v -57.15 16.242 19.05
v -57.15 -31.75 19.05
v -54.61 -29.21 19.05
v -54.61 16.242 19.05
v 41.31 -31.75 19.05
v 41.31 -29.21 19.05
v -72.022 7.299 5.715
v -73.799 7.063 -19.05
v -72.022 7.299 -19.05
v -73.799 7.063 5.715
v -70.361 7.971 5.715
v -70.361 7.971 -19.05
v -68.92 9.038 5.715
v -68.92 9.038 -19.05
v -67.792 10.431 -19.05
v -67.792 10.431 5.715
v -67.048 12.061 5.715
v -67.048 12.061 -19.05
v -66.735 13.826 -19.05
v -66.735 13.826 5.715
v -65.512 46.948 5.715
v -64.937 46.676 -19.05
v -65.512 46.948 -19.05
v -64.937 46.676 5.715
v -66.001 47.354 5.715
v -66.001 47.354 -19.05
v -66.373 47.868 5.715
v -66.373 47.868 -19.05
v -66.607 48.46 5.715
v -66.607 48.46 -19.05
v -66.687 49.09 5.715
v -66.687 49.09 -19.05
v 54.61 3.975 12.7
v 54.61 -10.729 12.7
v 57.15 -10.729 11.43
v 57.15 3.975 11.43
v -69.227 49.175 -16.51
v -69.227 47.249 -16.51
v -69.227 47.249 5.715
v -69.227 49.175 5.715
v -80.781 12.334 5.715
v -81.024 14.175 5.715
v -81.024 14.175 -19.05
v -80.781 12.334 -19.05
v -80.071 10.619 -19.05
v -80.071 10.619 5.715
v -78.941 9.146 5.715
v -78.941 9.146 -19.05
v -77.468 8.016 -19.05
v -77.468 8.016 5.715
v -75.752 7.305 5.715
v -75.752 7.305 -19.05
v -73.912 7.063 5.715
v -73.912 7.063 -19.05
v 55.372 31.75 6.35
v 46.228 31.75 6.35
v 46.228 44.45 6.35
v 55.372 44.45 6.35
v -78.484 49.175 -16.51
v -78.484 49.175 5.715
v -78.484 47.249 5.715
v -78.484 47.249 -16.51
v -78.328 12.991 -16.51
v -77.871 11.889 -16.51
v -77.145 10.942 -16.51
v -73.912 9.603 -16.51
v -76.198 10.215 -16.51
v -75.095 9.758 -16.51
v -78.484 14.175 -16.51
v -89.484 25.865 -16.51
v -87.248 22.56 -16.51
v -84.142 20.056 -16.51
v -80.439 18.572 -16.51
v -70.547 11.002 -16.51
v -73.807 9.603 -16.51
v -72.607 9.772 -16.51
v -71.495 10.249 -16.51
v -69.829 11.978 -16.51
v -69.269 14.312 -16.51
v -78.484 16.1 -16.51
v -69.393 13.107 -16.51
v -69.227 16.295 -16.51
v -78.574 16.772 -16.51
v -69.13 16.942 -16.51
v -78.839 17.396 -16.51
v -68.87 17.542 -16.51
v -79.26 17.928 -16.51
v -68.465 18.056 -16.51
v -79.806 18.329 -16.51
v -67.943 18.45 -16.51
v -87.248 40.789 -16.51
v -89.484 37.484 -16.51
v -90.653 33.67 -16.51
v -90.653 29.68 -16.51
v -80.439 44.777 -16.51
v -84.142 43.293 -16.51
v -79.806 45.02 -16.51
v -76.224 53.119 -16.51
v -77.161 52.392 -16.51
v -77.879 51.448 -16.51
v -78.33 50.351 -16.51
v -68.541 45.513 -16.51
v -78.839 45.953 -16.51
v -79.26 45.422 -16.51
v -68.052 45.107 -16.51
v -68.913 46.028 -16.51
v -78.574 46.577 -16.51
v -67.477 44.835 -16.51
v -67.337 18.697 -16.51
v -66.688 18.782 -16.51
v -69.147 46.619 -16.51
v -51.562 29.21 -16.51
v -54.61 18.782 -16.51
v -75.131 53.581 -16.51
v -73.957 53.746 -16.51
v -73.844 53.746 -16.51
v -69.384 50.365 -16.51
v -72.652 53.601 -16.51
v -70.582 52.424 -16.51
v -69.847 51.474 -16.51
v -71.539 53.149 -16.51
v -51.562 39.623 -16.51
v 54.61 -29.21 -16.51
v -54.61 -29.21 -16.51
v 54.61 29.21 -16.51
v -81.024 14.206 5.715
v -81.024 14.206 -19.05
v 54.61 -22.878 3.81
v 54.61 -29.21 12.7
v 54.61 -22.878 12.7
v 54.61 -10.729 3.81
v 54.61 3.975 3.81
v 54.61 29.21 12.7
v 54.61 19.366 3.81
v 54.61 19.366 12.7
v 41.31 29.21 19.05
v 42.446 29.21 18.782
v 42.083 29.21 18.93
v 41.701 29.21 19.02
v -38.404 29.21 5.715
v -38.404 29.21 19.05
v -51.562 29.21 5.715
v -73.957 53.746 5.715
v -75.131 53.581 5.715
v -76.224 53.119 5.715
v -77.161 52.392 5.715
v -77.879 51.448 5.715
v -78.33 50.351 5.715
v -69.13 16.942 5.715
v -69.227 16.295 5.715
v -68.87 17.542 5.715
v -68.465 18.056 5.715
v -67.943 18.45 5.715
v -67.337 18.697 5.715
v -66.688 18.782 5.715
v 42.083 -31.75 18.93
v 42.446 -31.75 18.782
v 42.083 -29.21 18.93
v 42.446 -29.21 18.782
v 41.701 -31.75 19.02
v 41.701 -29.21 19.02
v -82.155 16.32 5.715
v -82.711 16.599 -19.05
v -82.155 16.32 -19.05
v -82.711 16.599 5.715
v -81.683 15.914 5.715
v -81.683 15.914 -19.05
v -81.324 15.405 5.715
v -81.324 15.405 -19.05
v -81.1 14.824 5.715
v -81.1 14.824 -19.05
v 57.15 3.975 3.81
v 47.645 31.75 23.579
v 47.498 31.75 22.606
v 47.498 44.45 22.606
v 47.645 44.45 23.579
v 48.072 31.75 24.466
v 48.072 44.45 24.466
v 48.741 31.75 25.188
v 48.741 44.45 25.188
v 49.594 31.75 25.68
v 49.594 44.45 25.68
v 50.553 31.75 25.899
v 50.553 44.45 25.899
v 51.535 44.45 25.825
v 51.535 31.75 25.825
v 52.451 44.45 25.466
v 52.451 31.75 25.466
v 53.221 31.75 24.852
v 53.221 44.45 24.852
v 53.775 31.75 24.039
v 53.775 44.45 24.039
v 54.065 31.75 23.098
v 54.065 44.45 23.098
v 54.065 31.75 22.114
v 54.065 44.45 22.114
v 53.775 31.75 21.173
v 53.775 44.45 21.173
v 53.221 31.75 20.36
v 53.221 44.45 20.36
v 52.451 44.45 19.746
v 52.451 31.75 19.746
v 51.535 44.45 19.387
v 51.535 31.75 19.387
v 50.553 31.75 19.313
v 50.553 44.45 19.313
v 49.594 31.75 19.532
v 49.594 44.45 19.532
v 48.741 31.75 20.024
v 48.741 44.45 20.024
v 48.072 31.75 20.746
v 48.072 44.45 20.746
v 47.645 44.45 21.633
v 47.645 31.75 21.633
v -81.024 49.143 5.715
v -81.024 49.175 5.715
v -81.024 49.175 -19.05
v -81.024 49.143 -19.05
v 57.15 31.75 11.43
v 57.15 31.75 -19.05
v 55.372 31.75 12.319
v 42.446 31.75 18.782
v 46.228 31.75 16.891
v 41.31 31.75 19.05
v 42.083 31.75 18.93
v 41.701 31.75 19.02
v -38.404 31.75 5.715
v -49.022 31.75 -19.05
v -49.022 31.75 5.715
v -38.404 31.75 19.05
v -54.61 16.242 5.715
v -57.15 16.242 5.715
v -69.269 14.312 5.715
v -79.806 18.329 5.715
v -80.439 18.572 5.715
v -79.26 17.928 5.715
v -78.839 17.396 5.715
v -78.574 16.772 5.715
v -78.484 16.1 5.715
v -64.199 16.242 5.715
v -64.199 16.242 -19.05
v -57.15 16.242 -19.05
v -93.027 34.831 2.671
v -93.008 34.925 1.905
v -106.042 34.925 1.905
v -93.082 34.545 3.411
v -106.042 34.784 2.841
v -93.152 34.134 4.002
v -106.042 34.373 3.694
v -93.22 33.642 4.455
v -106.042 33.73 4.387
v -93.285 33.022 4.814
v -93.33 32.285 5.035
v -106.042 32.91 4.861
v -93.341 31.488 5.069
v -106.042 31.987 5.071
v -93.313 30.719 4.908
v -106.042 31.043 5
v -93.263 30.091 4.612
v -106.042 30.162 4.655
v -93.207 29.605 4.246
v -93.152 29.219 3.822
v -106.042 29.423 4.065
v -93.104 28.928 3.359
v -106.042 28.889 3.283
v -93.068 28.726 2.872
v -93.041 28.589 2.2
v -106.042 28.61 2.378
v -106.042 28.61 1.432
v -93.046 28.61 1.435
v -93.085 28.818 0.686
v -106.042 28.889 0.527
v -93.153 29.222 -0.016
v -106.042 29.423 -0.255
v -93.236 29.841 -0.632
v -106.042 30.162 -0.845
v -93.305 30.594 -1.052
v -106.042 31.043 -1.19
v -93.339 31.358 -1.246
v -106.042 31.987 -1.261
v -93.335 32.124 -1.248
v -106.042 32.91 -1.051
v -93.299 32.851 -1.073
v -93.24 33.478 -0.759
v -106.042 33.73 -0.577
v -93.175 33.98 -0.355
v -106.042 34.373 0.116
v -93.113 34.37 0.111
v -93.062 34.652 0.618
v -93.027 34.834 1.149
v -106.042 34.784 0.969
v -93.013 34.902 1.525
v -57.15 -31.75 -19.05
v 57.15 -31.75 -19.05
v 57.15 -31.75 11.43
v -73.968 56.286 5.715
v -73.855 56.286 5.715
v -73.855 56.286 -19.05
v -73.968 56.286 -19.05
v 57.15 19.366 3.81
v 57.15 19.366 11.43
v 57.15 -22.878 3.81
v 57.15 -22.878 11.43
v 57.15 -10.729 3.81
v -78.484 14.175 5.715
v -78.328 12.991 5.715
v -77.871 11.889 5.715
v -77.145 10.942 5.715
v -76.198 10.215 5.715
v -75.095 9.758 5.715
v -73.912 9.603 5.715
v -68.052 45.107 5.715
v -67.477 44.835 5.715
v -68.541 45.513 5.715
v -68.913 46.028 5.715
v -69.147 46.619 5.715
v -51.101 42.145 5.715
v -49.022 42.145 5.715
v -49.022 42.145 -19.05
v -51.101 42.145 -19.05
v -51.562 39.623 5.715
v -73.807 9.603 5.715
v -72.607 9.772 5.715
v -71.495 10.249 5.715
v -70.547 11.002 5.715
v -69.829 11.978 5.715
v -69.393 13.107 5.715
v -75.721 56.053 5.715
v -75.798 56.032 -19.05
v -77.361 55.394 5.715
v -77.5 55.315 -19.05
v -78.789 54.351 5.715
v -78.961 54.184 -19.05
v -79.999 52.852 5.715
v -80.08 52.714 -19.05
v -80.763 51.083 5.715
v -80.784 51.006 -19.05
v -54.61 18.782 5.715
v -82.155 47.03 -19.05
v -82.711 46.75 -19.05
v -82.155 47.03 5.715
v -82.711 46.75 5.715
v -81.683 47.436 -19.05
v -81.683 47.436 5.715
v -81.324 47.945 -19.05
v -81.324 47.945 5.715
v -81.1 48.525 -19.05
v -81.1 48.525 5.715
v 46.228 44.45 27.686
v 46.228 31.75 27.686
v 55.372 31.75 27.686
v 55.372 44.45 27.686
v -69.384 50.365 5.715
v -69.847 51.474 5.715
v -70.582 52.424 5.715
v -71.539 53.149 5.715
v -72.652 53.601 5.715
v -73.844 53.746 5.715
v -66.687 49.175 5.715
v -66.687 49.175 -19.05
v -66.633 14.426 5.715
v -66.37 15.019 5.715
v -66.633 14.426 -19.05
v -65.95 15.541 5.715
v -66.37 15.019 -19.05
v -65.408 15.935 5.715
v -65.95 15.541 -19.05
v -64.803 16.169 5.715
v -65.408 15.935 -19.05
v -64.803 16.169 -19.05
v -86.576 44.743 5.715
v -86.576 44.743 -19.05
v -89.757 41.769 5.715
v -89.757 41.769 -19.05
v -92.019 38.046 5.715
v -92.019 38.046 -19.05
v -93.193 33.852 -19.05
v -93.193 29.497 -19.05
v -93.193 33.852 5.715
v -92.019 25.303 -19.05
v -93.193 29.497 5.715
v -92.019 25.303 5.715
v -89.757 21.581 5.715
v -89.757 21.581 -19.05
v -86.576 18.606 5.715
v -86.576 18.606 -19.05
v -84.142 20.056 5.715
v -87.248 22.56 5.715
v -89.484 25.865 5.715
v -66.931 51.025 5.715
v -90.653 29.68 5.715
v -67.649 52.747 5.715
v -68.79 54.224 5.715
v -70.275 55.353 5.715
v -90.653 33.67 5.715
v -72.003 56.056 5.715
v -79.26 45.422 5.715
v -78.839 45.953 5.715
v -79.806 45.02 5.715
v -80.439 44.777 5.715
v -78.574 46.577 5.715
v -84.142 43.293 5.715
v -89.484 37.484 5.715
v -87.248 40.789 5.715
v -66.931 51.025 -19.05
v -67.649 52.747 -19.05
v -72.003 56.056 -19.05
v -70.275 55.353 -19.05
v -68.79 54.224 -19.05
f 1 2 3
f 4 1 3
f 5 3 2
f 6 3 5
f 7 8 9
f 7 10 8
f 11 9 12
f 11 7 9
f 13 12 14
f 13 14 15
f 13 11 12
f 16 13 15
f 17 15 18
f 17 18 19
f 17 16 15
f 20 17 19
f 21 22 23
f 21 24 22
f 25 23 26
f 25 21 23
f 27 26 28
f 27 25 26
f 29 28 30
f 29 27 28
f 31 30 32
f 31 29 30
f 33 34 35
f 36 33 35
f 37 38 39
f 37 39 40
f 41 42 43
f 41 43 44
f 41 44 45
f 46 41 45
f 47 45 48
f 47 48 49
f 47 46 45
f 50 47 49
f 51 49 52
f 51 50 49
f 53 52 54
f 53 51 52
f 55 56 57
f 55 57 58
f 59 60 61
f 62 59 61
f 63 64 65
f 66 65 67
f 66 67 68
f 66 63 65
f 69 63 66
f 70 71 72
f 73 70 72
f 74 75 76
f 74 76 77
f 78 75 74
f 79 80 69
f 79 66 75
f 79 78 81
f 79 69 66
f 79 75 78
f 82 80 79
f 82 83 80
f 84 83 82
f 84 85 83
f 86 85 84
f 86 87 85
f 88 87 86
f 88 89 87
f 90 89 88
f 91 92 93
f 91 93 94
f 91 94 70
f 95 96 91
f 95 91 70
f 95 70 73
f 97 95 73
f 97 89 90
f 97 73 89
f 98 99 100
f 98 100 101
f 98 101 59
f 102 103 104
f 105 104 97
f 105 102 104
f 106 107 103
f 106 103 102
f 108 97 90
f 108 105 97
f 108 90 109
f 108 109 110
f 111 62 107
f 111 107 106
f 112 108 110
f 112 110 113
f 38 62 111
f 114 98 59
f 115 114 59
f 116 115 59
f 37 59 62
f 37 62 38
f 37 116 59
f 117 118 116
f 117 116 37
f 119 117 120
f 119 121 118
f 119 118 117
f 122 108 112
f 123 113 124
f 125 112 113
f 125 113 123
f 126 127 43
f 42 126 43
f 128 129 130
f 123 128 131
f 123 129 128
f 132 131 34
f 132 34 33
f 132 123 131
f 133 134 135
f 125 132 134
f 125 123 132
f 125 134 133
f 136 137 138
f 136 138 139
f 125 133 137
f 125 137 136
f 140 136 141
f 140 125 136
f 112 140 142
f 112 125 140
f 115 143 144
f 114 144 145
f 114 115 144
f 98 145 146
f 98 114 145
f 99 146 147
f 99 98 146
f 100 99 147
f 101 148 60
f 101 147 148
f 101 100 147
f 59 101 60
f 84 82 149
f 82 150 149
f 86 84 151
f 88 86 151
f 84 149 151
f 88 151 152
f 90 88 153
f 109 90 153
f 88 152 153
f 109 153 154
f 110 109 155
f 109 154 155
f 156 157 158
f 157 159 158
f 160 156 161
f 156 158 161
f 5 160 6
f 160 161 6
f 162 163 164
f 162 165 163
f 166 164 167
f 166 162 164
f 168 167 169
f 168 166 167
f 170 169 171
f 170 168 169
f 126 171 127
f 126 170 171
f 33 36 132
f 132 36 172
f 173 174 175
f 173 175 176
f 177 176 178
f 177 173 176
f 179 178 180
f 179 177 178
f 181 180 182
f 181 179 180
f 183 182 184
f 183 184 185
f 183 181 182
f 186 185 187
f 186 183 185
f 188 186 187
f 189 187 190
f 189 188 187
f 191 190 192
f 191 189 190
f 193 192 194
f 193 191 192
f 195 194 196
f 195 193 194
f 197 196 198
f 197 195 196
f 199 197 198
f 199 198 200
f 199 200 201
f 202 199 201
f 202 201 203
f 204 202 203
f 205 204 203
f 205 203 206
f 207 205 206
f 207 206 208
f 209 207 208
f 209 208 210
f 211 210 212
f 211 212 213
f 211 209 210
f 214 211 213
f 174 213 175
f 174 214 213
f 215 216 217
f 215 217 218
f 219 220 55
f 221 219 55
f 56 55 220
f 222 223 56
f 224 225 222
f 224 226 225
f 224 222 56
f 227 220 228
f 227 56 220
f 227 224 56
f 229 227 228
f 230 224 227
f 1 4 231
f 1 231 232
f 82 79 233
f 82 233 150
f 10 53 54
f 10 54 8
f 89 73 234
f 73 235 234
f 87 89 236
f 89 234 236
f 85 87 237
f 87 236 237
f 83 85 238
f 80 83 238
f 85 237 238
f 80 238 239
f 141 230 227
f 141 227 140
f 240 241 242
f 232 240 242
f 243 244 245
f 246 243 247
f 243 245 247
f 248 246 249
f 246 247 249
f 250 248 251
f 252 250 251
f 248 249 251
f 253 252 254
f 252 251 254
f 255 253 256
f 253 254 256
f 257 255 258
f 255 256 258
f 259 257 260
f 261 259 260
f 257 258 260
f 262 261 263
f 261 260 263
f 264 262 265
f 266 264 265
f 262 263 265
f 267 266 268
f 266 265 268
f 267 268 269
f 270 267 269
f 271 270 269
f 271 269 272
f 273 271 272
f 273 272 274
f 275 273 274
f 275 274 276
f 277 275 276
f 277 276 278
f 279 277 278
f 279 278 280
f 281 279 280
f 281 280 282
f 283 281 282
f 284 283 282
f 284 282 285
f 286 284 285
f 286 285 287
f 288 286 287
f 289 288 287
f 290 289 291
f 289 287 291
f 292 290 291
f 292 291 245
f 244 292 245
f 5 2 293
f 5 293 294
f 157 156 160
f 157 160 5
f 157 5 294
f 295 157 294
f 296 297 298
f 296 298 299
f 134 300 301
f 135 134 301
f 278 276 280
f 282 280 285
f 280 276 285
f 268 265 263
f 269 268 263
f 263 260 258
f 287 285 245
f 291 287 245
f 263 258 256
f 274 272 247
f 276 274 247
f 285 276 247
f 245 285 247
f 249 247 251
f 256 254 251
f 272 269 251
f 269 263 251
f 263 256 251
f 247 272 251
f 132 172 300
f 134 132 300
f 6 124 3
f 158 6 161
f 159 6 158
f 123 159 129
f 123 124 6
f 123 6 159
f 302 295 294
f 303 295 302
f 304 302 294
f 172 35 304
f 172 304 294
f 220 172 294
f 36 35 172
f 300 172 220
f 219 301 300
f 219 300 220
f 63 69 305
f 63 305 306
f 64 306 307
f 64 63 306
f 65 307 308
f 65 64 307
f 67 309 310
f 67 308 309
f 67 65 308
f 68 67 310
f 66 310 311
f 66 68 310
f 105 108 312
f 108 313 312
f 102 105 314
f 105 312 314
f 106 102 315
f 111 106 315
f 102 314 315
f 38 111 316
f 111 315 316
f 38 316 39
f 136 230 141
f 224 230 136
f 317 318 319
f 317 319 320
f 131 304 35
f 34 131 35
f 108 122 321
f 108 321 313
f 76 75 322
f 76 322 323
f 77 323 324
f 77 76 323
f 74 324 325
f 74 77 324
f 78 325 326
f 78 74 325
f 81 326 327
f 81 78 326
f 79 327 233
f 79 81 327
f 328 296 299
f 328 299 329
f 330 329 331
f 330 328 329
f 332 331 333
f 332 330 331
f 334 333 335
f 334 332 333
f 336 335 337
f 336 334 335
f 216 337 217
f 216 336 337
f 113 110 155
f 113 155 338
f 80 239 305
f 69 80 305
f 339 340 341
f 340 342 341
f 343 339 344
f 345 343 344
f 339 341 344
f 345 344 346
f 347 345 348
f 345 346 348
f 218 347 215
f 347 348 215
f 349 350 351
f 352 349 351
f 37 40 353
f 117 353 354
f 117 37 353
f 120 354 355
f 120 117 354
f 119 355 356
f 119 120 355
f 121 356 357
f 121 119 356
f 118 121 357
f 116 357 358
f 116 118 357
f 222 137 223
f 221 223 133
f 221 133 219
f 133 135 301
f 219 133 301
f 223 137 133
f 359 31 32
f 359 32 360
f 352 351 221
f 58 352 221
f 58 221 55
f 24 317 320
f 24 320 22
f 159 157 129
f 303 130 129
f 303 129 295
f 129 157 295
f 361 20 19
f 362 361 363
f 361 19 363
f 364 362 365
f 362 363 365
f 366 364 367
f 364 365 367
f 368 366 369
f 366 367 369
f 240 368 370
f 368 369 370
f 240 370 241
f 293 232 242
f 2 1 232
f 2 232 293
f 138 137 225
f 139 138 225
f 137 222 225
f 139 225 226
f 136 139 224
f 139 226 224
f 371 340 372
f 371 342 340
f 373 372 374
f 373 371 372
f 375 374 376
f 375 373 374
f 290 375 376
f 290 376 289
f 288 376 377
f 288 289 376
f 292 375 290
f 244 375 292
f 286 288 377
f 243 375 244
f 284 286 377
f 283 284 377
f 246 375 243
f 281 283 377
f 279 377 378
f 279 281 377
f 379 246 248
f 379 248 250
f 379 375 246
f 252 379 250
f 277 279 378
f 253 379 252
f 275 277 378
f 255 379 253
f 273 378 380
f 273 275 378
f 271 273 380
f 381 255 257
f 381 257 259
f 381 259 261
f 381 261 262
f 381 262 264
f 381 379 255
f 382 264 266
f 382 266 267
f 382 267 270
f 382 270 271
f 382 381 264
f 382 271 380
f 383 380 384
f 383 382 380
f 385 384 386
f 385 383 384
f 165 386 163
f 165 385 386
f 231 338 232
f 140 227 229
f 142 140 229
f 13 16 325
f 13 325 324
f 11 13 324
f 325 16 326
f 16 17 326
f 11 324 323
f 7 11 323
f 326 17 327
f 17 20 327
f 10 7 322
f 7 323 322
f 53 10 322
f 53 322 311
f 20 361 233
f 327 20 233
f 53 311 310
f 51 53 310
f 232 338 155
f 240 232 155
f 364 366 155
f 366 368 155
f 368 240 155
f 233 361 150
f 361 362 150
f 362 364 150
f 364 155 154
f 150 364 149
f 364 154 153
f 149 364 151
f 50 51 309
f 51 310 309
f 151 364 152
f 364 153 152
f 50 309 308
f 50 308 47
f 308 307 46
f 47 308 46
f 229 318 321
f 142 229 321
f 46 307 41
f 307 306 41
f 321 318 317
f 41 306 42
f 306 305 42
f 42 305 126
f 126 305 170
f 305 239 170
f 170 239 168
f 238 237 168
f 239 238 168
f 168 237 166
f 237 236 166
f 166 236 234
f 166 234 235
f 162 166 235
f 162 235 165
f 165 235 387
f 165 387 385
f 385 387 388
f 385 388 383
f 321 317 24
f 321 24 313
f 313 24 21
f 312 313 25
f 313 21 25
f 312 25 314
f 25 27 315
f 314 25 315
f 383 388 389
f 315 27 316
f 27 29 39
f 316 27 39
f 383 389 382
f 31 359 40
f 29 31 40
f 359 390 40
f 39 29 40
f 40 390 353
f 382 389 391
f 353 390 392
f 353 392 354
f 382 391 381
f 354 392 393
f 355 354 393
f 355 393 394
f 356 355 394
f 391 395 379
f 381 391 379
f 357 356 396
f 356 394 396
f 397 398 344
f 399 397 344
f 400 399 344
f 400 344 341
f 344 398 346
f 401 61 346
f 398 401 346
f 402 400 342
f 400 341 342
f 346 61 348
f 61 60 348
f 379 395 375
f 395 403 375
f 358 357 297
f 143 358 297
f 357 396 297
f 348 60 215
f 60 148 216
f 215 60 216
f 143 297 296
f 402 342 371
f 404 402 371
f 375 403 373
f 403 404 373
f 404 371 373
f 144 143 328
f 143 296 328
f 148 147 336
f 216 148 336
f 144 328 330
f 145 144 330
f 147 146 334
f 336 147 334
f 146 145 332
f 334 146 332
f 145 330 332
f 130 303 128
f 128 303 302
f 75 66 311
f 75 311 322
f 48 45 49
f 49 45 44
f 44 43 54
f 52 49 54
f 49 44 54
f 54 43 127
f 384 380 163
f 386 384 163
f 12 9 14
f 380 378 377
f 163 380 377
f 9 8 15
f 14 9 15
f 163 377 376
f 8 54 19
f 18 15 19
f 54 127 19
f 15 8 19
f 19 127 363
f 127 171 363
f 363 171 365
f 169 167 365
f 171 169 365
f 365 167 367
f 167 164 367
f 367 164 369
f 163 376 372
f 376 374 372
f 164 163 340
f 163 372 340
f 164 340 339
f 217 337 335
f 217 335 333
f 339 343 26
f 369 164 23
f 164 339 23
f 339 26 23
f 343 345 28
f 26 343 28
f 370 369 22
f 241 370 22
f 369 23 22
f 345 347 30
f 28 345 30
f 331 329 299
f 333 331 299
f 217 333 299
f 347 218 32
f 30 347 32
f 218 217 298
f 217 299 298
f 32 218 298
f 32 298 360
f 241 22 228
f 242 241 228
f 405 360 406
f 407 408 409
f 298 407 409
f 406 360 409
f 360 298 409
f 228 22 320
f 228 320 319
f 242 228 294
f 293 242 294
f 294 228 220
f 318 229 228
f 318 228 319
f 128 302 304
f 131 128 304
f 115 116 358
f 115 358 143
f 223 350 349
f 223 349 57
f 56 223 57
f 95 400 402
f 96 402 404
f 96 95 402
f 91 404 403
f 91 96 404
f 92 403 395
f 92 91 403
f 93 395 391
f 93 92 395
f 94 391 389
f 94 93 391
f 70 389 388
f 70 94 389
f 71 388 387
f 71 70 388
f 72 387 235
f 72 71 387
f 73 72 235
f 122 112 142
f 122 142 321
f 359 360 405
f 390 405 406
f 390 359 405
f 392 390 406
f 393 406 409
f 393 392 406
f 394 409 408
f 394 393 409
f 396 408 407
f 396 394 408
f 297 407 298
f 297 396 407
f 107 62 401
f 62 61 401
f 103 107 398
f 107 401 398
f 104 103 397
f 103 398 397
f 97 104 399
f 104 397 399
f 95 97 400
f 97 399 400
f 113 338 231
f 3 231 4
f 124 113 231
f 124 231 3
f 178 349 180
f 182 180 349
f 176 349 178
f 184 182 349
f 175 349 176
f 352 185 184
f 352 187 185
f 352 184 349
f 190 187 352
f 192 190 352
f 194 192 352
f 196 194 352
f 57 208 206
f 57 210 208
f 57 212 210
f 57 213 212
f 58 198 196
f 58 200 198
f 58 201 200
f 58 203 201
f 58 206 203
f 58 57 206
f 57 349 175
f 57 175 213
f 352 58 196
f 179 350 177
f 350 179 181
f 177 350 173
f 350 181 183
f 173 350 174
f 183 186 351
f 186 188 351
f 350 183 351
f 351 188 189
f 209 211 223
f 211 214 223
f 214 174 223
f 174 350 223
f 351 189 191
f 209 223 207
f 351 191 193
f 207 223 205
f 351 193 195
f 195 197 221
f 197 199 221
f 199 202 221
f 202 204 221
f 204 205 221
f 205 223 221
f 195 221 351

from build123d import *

# Parameters (mm, degrees)
BOSS_EXTRUDE1_DEPTH      = 19.05
SHELL3_START             = -16.51
SHELL3_DEPTH             = 35.56
SKETCH7_W                = 9.144
SKETCH7_H                = 21.336
SKETCH7_R                = 3.302
BOSS_EXTRUDE3_DEPTH      = 12.7
CHAMFER1_SIZE            = 15.24
CHAMFER1_SIZE_2          = 7.62
CUT_EXTRUDE4_DEPTH       = 13.335
BOSS_EXTRUDE4_DEPTH      = 1.27
BOSS_EXTRUDE4_DEPTH_BACK = 12.7
SKETCH9_R                = 3.175
CUT_EXTRUDE5_DEPTH       = 2.54
FILLET1_R                = 2.54
FILLET2_R                = 2.54


# Read off the part's stored shape, not the designer's step: Shell3
with BuildPart() as part:
    # Sketch1 → Boss-Extrude1 (new, symmetric)
    with BuildSketch(Plane.XY):
        with BuildLine():
            Line((-57.15, -31.75), (57.15, -31.75))
            Line((57.15, -31.75), (57.15, 31.75))
            Line((57.15, 31.75), (-49.022, 31.75))
            Line((-49.022, 31.75), (-49.022, 42.144910037))
            Line((-49.022, 42.144910037), (-51.100806987, 42.144910037))
            Line((-51.100806987, 42.144910037), (-66.686518268, 47.249120101))
            Line((-66.686518268, 47.249120101), (-66.686518268, 49.174694101))
            ThreePointArc((-66.686518268, 49.174694101), (-68.789611639, 54.223594812), (-73.855077994, 56.286469196))
            Line((-73.855077994, 56.286469196), (-73.968197446, 56.286469196))
            ThreePointArc((-73.968197446, 56.286469196), (-78.960538431, 54.18360073), (-81.02363772, 49.174694101))
            Line((-81.02363772, 49.174694101), (-81.02363772, 47.249120101))
            ThreePointArc((-81.02363772, 47.249120101), (-93.341814168, 31.674687064), (-81.02363772, 16.100254027))
            Line((-81.02363772, 16.100254027), (-81.02363772, 14.174680027))
            ThreePointArc((-81.02363772, 14.174680027), (-78.940581148, 9.145736599), (-73.91163772, 7.062680027))
            Line((-73.91163772, 7.062680027), (-73.798518268, 7.062680027))
            ThreePointArc((-73.798518268, 7.062680027), (-68.74596031, 9.210475671), (-66.728346573, 14.31641367))
            Line((-66.728346573, 14.31641367), (-66.687998915, 16.24156491))
            Line((-66.687998915, 16.24156491), (-57.15, 16.24156491))
            Line((-57.15, 16.24156491), (-57.15, -31.75))
        make_face()
    extrude(amount=BOSS_EXTRUDE1_DEPTH, both=True)

    # Shell3 outline → Shell3 (cut)
    with BuildSketch(Plane.XY.offset(SHELL3_START)):
        with BuildLine():
            Line((54.61, 29.21), (-51.562, 29.21))
            Line((-51.562, 29.21), (-51.562, 39.623206475))
            Line((-51.562, 39.623206475), (-69.226518268, 45.408211104))
            Line((-69.226518268, 45.408211104), (-69.226518268, 49.174694101))
            ThreePointArc((-69.226518268, 49.174694101), (-70.581699125, 52.423579848), (-73.843866737, 53.746469196))
            Line((-73.843866737, 53.746469196), (-73.956986189, 53.746469196))
            ThreePointArc((-73.956986189, 53.746469196), (-77.160523467, 52.391513244), (-78.48363772, 49.174694101))
            Line((-78.48363772, 49.174694101), (-78.48363772, 45.090596577))
            ThreePointArc((-78.48363772, 45.090596577), (-90.801814168, 31.674687064), (-78.48363772, 18.258777551))
            Line((-78.48363772, 18.258777551), (-78.48363772, 14.174680027))
            ThreePointArc((-78.48363772, 14.174680027), (-77.144529924, 10.941787823), (-73.91163772, 9.602680027))
            Line((-73.91163772, 9.602680027), (-73.806528971, 9.602680027))
            ThreePointArc((-73.806528971, 9.602680027), (-70.546554352, 11.002273539), (-69.268997314, 14.311978137))
            Line((-69.268997314, 14.311978137), (-69.175322928, 18.78156491))
            Line((-69.175322928, 18.78156491), (-54.61, 18.78156491))
            Line((-54.61, 18.78156491), (-54.61, -29.21))
            Line((-54.61, -29.21), (54.61, -29.21))
            Line((54.61, -29.21), (54.61, 29.21))
        make_face()
    extrude(amount=SHELL3_DEPTH, mode=Mode.SUBTRACT)

    # Sketch7 → Boss-Extrude3 (add)
    with BuildSketch(Plane(origin=(0, 31.75, 0), x_dir=(1, 0, 0), z_dir=(0, 1, 0))):
        with Locations((50.8, -17.018)):
            Rectangle(SKETCH7_W, SKETCH7_H)
        with Locations(Location((50.8, -22.606, 0), (0, 0, 180))):
            Circle(SKETCH7_R, mode=Mode.SUBTRACT)
    extrude(amount=BOSS_EXTRUDE3_DEPTH)

    # Chamfer1
    # the kernel refuses this chamfer: 15.24, 7.62 mm, written as the material it takes off along each edge
    with BuildSketch(Plane(origin=(57.15, -71.218992037, 19.05), x_dir=(-0.9998508956747117, 0, 0.017268075123668167), z_dir=(0, 1, 0))) as chamfer1_piece_1:
        Polygon((CHAMFER1_SIZE * 0.999850895675, -CHAMFER1_SIZE * 0.0172680751237), (-CHAMFER1_SIZE_2 * 0.0172680751237, -CHAMFER1_SIZE_2 * 0.999850895675), (0, 0), align=None)
    extrude(amount=102.968992037, mode=Mode.SUBTRACT)

    # Sketch8 → Cut-Extrude4 (cut)
    with BuildSketch(Plane.XY.offset(19.05)):
        with BuildLine():
            Line((-66.610527579, 49.002799892), (-66.610527579, 47.279305102))
            Line((-66.610527579, 47.279305102), (-51.100806987, 42.144910037))
            Line((-51.100806987, 42.144910037), (-38.403655113, 42.144910037))
            Line((-38.403655113, 42.144910037), (-38.403655113, 16.24156491))
            Line((-38.403655113, 16.24156491), (-66.687998915, 16.24156491))
            Line((-66.687998915, 16.24156491), (-66.726931852, 14.174565202))
            ThreePointArc((-66.726931852, 14.174565202), (-67.907528646, 10.164808506), (-71.108849398, 7.477150977))
            ThreePointArc((-71.108849398, 7.477150977), (-77.894512097, 8.119410548), (-81.02363772, 14.174680027))
            Line((-81.02363772, 14.174680027), (-81.02363772, 16.100254027))
            ThreePointArc((-81.02363772, 16.100254027), (-93.341814168, 31.674687064), (-81.02363772, 47.249120101))
            Line((-81.02363772, 47.249120101), (-81.02363772, 49.174694101))
            ThreePointArc((-81.02363772, 49.174694101), (-80.441084846, 51.993712411), (-78.788861502, 54.350912042))
            ThreePointArc((-78.788861502, 54.350912042), (-70.907499507, 55.757912789), (-66.610527579, 49.002799892))
        make_face()
    extrude(amount=-CUT_EXTRUDE4_DEPTH, mode=Mode.SUBTRACT)

    # Sketch9 → Boss-Extrude4 (add, two sides: drawn at the far end of the back side and taken through both)
    with BuildSketch(Plane(origin=(-93.341814168, 0, 0), x_dir=(0, 0, -1), z_dir=(1, 0, 0)).offset(-BOSS_EXTRUDE4_DEPTH_BACK)):
        with Locations(Location((-1.905, 31.75, 0), (0, 0, 90))):
            Circle(SKETCH9_R)
    extrude(amount=BOSS_EXTRUDE4_DEPTH + BOSS_EXTRUDE4_DEPTH_BACK)

    # Sketch10 → Cut-Extrude5 (cut)
    with BuildSketch(Plane(origin=(57.15, 0, 0), x_dir=(0, 0, -1), z_dir=(1, 0, 0))):
        Polygon((-19.05, -29.21), (-13.314117838, -29.21), (-13.314117838, -22.878143144), (-3.81, -22.878143144), (-3.81, -10.729059706), (-13.314117838, -10.729059706), (-13.314117838, 3.974723841), (-3.81, 3.974723841), (-3.81, 19.366104348), (-13.314117838, 19.366104348), (-13.314117838, 29.21), (-19.05, 29.21), align=None)
    extrude(amount=-CUT_EXTRUDE5_DEPTH, mode=Mode.SUBTRACT)

    # Fillet1
    fillet1_edges = [part.edges().sort_by_distance(p)[0] for p in [
        (-81.02363772, 16.100254027, -6.6675),
        (-78.48363772, 18.258777551, -5.3975),
        (-69.175322928, 18.78156491, -5.3975),
        (-66.687998915, 16.24156491, -6.6675),
        (-69.226518268, 45.408211104, -5.3975),
        (-66.686518268, 47.249120101, -6.6675),
        (-81.02363772, 47.249120101, -6.6675),
        (-78.48363772, 45.090596577, -5.3975),
    ]]
    fillet(fillet1_edges, radius=FILLET1_R)

    # Fillet2
    fillet2_edges = [part.edges().sort_by_distance(p)[0] for p in [
        (41.91, 30.48, 19.05),
        (41.91, -30.48, 19.05),
    ]]
    fillet(fillet2_edges, radius=FILLET2_R)


solid = part.part
